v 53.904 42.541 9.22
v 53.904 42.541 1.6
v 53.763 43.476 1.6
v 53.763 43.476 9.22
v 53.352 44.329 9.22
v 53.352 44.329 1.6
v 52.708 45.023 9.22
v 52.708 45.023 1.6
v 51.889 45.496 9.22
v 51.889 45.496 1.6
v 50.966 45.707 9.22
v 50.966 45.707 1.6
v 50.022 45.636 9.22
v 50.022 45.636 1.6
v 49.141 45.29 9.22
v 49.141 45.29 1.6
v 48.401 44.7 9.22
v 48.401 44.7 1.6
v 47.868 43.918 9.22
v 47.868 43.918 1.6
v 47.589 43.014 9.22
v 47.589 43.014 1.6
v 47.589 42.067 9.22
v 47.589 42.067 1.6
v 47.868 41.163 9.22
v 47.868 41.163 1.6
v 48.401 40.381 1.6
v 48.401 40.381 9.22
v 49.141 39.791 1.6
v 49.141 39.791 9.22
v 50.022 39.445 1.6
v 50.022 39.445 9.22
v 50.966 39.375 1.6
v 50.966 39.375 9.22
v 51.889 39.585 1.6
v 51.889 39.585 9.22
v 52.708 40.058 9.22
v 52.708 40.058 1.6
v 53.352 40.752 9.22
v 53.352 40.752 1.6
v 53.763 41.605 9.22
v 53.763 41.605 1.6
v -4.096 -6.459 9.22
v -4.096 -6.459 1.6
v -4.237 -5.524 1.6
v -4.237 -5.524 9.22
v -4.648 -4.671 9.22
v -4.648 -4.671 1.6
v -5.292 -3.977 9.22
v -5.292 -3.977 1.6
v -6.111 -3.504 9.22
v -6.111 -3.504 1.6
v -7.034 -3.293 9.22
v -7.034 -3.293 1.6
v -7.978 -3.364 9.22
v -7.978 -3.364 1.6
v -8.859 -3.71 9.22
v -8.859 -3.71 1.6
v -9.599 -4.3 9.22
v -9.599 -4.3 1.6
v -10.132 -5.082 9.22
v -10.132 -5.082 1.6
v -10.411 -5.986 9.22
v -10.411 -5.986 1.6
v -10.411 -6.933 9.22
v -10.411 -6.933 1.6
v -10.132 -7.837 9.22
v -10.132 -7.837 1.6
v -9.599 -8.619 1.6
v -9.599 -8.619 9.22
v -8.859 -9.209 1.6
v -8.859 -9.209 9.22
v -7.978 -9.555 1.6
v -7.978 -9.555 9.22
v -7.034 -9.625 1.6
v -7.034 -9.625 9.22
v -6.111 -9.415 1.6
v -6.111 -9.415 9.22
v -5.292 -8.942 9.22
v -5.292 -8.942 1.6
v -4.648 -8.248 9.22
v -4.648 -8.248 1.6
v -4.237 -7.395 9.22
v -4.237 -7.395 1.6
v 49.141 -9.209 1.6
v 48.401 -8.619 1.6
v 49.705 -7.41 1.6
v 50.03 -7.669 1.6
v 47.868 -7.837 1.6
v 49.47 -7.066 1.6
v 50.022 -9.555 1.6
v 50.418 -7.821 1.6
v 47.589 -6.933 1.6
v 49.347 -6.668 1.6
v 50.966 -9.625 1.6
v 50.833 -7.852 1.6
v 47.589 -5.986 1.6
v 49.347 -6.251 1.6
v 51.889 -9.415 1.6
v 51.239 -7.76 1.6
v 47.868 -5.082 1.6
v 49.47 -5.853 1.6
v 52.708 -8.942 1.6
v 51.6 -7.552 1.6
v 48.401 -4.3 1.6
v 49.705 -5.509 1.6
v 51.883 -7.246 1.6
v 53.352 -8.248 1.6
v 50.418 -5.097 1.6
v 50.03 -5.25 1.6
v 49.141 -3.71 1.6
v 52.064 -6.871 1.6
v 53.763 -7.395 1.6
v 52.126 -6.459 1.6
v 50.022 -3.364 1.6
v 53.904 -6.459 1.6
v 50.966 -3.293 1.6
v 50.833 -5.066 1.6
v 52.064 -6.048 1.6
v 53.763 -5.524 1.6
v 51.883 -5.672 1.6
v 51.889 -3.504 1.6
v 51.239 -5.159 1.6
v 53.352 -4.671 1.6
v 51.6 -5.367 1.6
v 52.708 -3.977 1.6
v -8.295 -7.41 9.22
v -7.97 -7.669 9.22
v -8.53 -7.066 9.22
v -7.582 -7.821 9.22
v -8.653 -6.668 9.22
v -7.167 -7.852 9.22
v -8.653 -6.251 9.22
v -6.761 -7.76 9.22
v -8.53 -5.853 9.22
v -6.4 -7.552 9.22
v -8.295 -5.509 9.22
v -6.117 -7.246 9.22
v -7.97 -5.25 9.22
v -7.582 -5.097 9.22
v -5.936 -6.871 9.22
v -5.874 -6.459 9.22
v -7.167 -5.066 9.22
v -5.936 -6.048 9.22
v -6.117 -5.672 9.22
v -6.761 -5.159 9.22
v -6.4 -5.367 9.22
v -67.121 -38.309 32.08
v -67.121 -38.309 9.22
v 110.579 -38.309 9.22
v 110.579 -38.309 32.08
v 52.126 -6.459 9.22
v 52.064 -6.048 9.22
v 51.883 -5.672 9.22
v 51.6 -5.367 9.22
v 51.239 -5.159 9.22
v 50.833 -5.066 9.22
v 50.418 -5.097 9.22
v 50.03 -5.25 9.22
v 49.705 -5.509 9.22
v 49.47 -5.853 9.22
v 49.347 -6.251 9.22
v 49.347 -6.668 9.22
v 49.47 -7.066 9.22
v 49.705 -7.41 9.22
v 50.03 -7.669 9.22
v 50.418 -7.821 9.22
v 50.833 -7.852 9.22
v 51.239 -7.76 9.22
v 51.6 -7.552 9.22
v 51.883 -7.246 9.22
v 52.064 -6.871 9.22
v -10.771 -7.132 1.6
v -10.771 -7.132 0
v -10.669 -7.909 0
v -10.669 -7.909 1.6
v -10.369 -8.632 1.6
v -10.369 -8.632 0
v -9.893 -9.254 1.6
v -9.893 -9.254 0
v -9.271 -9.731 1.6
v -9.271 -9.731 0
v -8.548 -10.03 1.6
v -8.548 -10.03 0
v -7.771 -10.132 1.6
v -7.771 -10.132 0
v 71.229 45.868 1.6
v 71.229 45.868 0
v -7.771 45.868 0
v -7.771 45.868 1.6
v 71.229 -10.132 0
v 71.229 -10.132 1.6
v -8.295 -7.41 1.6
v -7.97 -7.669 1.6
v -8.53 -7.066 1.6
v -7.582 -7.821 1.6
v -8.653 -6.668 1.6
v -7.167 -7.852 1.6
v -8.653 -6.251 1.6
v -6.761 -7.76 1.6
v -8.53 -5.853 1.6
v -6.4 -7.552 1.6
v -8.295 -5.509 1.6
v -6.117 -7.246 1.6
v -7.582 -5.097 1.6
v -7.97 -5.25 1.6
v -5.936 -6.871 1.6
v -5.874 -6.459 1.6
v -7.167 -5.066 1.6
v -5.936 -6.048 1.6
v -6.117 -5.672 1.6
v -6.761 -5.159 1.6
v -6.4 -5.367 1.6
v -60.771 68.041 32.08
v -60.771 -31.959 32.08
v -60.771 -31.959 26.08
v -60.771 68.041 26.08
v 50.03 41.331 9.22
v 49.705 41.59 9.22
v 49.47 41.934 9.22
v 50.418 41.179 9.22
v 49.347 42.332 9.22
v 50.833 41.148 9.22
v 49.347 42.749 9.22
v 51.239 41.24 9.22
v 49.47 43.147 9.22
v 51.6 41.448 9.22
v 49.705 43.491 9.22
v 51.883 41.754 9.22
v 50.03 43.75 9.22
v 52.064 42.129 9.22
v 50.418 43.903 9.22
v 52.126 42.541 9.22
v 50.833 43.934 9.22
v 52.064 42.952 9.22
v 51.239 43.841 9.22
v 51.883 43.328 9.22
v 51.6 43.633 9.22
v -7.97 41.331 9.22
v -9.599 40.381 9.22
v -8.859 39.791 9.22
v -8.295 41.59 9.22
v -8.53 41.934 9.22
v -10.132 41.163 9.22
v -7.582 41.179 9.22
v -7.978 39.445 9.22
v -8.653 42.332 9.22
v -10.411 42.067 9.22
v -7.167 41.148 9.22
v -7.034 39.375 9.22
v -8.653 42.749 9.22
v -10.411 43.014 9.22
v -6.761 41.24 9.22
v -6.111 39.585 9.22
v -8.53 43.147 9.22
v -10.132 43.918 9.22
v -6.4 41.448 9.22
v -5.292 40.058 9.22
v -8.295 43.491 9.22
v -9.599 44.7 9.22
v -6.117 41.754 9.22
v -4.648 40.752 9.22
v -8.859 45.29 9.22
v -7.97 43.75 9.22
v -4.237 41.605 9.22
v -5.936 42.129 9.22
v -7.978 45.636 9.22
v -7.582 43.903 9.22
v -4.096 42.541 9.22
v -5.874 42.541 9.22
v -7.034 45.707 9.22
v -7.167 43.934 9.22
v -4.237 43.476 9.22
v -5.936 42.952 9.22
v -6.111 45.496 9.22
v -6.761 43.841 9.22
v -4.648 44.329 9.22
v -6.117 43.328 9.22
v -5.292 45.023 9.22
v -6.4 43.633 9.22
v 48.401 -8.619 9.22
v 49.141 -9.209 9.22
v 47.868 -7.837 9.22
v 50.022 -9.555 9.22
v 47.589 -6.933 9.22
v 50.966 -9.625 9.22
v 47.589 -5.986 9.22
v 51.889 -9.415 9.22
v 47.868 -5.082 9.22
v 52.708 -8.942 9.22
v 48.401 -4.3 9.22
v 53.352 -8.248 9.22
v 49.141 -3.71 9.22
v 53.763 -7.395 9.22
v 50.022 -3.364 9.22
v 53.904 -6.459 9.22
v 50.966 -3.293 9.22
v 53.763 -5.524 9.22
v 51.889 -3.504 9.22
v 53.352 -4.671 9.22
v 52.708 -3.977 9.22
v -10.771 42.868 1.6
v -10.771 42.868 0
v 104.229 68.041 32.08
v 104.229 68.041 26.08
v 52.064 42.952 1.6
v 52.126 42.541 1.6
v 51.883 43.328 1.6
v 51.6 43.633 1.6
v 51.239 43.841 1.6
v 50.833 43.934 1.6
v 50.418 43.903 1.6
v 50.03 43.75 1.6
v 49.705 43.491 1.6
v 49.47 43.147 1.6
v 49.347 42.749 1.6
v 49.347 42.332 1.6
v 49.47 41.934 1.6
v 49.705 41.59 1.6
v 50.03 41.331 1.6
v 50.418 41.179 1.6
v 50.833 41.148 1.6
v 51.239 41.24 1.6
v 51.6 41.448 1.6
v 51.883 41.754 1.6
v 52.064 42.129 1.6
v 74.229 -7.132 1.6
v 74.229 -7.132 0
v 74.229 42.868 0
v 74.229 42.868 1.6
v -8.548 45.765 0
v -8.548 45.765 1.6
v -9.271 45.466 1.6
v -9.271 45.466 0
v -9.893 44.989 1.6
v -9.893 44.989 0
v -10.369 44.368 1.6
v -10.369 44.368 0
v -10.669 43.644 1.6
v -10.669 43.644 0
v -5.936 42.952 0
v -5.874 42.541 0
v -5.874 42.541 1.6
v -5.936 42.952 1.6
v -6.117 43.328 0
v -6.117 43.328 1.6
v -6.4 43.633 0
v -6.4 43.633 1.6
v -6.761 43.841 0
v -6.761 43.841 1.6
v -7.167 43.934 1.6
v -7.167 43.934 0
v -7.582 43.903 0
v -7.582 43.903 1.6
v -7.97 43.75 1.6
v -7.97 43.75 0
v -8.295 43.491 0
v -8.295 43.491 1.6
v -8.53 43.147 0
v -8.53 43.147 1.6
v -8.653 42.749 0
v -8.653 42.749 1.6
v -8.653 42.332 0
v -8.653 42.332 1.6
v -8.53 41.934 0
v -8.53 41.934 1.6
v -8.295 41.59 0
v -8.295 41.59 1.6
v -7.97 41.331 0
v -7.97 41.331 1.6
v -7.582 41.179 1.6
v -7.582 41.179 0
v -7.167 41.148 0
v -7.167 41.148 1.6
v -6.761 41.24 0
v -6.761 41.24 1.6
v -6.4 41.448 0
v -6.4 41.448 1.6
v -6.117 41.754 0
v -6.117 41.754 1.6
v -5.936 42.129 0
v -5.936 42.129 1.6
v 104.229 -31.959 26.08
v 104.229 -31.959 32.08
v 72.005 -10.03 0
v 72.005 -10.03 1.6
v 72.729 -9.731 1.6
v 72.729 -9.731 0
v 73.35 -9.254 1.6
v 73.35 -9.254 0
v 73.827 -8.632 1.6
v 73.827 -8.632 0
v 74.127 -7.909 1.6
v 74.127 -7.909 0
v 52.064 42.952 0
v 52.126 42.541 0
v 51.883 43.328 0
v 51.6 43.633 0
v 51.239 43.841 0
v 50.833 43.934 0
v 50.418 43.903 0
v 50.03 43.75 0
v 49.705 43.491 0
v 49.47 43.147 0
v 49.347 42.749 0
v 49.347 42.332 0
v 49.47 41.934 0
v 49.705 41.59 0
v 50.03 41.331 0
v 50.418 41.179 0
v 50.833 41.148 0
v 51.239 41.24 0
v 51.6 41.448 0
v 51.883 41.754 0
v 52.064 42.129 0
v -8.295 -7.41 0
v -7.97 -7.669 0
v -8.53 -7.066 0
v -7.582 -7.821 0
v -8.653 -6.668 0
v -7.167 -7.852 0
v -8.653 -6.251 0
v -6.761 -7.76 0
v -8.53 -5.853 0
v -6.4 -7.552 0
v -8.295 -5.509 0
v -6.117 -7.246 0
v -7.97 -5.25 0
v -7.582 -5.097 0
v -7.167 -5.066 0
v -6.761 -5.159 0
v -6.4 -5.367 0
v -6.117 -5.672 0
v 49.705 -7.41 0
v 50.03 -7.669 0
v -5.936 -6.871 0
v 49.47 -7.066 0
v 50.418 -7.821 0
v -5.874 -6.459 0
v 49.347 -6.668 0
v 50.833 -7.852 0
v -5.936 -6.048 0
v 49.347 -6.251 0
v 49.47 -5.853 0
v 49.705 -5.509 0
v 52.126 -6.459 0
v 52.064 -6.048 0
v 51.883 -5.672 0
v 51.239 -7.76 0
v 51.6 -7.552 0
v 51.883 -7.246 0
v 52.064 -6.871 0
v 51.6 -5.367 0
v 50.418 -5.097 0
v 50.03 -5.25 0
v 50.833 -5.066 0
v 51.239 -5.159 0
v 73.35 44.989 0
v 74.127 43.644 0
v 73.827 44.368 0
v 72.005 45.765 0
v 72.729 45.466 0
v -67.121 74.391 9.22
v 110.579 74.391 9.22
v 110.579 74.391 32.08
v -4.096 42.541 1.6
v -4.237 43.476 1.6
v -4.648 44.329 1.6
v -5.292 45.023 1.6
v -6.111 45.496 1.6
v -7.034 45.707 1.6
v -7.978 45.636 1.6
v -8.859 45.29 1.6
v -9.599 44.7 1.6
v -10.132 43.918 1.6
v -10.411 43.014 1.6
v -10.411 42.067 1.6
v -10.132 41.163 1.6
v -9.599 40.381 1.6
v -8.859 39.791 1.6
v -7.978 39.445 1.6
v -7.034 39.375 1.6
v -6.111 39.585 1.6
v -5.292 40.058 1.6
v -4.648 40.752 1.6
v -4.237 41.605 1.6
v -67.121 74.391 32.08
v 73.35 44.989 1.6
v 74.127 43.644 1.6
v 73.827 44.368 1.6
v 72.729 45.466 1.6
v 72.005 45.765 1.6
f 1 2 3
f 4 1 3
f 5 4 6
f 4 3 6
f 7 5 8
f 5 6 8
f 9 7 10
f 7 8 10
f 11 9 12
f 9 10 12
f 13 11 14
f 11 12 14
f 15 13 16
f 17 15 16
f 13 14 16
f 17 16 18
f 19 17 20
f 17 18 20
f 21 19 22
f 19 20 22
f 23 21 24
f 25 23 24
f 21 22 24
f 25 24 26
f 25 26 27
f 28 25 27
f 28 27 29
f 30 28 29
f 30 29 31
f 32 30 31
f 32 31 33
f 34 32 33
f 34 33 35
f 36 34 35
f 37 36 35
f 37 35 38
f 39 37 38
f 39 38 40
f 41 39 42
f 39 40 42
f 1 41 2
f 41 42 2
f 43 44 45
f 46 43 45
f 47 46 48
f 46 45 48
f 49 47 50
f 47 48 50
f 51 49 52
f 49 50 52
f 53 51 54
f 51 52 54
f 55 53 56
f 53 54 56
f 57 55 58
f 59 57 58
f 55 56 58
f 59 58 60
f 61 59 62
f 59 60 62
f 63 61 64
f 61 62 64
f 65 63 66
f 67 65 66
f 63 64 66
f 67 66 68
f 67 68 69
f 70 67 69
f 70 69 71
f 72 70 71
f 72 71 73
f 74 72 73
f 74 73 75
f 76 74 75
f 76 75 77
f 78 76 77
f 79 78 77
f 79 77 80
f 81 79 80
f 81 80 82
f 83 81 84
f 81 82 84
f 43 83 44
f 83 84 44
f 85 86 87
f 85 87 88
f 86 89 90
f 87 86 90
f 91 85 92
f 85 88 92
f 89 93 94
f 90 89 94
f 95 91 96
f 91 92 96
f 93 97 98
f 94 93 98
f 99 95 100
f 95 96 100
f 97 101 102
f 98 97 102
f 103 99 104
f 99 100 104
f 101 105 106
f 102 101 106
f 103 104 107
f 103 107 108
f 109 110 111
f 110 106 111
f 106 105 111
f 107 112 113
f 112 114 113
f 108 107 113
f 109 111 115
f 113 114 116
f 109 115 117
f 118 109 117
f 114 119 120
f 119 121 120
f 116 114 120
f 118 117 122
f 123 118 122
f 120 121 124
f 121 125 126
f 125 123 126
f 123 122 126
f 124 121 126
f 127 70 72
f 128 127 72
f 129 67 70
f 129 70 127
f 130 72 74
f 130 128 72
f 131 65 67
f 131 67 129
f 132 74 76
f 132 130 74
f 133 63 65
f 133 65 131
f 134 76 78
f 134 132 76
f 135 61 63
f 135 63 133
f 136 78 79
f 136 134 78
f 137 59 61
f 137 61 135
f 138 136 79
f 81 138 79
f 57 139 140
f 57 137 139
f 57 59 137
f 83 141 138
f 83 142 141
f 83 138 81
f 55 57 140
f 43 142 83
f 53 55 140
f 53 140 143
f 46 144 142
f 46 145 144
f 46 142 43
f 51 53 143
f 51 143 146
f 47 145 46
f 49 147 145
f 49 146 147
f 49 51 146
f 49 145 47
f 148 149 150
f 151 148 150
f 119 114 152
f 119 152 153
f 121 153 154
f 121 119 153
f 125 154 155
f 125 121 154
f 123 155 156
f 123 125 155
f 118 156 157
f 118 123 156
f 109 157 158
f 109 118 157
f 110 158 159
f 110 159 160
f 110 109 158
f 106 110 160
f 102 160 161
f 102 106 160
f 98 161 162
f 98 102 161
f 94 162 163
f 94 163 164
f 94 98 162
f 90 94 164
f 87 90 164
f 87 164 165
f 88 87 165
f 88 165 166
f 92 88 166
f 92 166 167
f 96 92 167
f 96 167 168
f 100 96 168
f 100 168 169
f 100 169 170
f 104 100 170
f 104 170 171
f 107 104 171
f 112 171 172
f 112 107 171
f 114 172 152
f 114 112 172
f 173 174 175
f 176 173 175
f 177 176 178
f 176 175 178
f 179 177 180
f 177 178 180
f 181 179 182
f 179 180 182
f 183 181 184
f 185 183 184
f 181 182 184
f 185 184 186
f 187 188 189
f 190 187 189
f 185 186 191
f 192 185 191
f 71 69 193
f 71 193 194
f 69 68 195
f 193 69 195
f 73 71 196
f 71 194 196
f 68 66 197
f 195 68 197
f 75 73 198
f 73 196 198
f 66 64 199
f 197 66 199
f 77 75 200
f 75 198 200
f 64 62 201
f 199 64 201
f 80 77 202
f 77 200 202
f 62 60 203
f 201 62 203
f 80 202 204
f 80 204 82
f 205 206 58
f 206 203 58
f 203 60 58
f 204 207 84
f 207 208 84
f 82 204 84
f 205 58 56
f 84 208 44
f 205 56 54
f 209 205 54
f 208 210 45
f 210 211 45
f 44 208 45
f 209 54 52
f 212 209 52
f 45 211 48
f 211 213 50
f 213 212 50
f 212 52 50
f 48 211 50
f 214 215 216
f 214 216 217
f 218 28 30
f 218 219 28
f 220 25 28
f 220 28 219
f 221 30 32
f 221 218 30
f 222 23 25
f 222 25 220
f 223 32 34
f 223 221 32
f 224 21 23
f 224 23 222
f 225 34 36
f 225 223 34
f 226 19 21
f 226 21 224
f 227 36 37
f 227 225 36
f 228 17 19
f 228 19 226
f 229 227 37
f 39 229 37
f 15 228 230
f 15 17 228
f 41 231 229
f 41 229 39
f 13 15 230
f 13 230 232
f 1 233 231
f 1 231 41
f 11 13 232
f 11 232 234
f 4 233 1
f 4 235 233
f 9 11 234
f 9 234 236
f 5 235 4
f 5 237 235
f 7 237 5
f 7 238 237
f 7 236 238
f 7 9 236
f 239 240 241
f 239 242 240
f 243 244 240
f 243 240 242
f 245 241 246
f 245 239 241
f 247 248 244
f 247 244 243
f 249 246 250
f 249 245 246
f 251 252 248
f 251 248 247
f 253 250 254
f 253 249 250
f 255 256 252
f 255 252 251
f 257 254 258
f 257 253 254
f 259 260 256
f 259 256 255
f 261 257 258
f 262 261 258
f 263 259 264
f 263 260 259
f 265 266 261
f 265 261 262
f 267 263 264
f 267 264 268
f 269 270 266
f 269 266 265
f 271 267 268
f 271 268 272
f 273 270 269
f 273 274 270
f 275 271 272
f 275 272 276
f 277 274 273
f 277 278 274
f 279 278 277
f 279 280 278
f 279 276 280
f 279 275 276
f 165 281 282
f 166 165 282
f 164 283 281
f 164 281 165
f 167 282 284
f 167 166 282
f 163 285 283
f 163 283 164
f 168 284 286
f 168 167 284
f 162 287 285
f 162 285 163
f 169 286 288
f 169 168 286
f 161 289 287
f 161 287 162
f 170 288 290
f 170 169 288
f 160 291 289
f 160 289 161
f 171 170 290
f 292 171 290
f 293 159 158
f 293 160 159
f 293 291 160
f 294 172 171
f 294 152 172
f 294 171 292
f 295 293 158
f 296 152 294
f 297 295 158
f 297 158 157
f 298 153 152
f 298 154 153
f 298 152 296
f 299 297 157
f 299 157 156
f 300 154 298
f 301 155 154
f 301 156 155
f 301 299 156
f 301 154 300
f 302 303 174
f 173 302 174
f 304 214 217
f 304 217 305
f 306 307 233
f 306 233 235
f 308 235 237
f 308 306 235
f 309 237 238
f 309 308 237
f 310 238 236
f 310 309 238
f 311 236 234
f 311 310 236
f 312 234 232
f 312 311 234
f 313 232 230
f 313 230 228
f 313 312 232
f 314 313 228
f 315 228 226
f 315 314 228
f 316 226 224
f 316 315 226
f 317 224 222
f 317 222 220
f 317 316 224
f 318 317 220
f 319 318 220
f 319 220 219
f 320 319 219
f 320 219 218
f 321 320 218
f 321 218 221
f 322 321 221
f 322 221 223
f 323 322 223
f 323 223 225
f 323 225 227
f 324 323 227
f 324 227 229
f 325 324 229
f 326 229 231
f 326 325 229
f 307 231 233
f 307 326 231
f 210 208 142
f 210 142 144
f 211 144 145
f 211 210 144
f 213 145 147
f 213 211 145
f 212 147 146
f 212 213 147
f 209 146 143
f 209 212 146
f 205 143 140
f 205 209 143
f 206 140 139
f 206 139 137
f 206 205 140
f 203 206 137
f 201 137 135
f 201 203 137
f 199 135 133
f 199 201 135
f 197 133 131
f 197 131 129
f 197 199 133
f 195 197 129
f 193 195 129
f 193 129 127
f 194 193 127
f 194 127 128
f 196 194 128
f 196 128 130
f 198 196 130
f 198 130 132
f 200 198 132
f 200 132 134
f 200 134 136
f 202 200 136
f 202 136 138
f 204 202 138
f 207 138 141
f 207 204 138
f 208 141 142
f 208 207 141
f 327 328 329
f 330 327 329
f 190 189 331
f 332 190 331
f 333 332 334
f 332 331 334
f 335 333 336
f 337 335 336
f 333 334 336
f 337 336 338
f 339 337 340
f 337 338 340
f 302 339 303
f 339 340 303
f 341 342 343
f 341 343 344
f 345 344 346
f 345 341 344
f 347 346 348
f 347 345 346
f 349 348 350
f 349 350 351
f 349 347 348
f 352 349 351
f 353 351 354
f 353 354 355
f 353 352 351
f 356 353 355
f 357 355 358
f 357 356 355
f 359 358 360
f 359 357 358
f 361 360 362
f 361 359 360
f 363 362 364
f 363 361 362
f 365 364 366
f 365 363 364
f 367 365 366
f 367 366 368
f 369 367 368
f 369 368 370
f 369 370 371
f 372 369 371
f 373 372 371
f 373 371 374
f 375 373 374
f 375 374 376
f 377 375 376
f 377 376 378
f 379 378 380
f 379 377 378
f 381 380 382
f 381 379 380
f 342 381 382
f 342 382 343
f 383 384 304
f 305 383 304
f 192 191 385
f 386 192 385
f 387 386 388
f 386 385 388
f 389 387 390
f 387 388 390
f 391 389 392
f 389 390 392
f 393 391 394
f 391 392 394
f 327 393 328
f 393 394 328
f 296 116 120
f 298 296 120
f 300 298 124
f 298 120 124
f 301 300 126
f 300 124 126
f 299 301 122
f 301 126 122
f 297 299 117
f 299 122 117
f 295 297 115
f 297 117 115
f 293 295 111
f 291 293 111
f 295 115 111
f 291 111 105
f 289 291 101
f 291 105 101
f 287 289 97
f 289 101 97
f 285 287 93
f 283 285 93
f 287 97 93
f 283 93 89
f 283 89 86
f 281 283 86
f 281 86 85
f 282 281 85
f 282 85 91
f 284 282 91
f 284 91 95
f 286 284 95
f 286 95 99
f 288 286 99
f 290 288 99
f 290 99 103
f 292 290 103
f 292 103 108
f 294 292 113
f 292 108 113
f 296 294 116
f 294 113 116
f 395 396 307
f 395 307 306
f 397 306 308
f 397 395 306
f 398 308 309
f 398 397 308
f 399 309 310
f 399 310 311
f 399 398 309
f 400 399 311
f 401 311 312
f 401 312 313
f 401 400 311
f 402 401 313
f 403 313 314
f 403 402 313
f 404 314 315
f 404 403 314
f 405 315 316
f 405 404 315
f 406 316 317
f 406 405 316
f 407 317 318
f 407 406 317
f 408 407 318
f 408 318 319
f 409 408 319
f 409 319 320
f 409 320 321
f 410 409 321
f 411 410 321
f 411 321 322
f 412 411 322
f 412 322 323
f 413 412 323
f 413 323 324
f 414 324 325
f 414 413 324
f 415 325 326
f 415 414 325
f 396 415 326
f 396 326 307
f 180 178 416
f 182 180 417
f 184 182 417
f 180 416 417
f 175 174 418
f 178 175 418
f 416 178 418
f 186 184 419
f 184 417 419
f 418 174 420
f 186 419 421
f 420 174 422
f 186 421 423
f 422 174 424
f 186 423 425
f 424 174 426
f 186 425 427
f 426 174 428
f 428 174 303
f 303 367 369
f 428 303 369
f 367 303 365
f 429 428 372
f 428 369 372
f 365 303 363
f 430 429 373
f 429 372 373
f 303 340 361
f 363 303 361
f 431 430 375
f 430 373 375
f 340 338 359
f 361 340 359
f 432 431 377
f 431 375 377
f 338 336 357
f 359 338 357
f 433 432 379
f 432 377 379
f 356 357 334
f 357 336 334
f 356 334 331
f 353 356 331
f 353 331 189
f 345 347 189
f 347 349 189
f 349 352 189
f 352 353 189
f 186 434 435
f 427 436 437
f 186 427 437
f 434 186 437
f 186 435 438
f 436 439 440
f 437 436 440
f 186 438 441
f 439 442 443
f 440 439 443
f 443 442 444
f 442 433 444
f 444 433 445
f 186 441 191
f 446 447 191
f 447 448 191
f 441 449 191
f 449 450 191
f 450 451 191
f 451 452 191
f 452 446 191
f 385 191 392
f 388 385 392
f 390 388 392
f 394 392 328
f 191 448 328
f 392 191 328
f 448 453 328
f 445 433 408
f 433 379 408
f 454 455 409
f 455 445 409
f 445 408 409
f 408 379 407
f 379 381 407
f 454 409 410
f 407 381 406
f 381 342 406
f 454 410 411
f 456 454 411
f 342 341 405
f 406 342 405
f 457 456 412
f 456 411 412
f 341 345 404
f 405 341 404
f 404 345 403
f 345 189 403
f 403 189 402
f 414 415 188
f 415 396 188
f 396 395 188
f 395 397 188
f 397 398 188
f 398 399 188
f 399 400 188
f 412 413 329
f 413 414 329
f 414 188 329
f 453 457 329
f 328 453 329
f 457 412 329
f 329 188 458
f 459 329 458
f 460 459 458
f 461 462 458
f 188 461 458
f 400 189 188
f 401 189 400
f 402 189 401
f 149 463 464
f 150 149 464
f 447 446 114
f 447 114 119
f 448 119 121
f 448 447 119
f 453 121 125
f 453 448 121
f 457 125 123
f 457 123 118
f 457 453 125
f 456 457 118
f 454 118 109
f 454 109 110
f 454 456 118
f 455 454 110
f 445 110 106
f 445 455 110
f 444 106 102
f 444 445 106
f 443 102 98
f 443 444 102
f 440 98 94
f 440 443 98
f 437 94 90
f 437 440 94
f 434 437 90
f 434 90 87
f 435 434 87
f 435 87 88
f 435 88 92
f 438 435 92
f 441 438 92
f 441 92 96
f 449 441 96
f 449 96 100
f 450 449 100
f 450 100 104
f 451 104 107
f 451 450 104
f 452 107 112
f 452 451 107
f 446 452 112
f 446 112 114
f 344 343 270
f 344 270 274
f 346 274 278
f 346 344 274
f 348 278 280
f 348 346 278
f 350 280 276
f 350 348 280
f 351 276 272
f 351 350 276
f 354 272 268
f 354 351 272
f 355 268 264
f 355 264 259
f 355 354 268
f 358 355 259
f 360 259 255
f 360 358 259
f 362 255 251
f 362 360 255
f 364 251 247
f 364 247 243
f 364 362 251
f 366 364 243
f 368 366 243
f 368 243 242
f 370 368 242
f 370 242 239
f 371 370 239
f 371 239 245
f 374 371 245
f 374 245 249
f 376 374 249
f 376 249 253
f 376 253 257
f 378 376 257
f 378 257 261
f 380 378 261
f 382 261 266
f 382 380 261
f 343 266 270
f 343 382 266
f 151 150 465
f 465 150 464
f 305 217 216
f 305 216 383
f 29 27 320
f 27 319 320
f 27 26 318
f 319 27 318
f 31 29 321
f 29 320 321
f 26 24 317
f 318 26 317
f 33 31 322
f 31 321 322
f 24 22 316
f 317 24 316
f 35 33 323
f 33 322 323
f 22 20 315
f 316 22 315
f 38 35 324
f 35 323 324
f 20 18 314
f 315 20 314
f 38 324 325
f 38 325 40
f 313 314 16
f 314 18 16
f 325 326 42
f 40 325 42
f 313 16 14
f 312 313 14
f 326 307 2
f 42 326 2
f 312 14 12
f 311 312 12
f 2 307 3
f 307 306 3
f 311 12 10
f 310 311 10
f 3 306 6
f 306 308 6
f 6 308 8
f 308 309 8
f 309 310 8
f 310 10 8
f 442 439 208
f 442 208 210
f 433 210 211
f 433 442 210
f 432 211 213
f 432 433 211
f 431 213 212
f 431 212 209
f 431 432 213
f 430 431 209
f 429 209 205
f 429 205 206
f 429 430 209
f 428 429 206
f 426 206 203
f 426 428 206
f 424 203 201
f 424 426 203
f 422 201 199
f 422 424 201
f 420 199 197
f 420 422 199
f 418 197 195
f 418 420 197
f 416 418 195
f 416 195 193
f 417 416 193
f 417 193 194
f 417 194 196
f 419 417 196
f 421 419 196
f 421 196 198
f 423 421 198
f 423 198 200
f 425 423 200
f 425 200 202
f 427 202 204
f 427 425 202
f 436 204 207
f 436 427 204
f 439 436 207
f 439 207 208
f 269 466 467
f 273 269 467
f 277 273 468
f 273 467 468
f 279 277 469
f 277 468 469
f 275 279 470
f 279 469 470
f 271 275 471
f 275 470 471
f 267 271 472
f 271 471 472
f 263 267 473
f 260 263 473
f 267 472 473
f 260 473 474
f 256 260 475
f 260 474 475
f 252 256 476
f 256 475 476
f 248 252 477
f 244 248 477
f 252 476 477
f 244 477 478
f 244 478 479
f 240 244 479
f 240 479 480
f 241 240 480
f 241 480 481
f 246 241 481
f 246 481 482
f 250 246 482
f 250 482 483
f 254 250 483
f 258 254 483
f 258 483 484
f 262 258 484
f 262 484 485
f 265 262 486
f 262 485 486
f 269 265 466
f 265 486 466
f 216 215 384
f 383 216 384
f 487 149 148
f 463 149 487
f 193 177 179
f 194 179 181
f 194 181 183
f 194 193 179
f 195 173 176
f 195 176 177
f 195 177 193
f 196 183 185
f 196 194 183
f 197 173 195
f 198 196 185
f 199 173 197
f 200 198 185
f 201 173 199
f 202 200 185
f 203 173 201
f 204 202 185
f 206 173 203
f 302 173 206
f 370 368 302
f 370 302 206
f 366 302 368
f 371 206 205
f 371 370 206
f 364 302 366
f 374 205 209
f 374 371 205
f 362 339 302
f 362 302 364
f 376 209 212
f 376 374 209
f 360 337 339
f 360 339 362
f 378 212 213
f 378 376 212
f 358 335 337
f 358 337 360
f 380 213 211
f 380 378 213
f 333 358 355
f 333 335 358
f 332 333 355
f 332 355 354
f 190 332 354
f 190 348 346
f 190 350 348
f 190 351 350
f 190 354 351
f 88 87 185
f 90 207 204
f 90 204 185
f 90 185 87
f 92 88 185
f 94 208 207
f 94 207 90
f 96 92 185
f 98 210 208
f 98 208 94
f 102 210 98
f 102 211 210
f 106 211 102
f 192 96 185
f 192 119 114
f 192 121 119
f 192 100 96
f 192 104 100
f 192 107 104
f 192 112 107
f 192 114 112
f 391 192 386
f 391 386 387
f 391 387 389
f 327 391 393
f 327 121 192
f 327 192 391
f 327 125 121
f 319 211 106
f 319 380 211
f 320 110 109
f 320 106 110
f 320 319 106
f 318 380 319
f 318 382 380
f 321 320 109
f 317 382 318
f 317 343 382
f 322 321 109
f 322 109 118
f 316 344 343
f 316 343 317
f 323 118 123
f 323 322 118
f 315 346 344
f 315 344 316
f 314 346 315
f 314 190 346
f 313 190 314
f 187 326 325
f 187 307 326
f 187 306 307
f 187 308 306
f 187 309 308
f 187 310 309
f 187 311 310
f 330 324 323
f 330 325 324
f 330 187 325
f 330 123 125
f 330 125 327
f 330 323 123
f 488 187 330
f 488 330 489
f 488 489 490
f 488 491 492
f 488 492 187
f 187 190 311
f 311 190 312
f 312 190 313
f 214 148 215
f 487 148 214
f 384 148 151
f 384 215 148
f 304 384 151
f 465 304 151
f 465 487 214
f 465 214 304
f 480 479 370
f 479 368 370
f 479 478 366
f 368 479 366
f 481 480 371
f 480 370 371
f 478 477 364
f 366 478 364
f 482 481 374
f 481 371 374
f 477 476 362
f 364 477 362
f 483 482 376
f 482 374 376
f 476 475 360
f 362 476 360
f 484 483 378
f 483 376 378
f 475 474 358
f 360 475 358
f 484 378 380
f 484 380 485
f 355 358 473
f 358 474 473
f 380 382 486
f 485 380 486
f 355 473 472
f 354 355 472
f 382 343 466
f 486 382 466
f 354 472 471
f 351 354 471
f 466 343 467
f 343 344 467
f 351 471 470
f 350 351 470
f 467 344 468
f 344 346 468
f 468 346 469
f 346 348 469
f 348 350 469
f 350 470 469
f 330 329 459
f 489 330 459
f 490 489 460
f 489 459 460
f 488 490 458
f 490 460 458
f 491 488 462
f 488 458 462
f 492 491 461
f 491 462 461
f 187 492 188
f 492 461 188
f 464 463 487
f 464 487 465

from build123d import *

# Parameters (mm, degrees)
F0_R      = 1.397
F1_DEPTH  = 1.6002
F2_R      = 3.175
F2_R_2    = 1.397
F3_DEPTH  = 7.62
F4_DEPTH  = 7.62
F5_DEPTH  = 7.62
F6_DEPTH  = 7.62
F7_W      = 177.699999
F7_H      = 112.699999
F8_DEPTH  = 22.86
F9_W      = 165
F9_H      = 100
F10_DEPTH = 6


with BuildPart() as f1:
    # F0 (on Top) → F1 (new body)
    with BuildSketch(Plane.XY):
        with BuildLine():
            ThreePointArc((-10.771206, -7.132443), (-9.892526, -9.253763), (-7.771206, -10.132443))
            Line((-7.771206, -10.132443), (71.228794, -10.132443))
            ThreePointArc((71.228794, -10.132443), (73.350115, -9.253763), (74.228794, -7.132443))
            Line((74.228794, -7.132443), (74.228794, 42.867557))
            ThreePointArc((74.228794, 42.867557), (73.350115, 44.988878), (71.228794, 45.867557))
            Line((71.228794, 45.867557), (-7.771206, 45.867557))
            ThreePointArc((-7.771206, 45.867557), (-9.892526, 44.988878), (-10.771206, 42.867557))
            Line((-10.771206, 42.867557), (-10.771206, 17.867557))
            Line((-10.771206, 17.867557), (-10.771206, -7.132443))
        make_face()
        with Locations((-7.271206, -6.459374)):
            Circle(F0_R, mode=Mode.SUBTRACT)
        with Locations((50.728794, -6.459374)):
            Circle(F0_R, mode=Mode.SUBTRACT)
        with Locations((-7.271206, 42.540626)):
            Circle(F0_R, mode=Mode.SUBTRACT)
        with Locations((50.728794, 42.540626)):
            Circle(F0_R, mode=Mode.SUBTRACT)
    extrude(amount=F1_DEPTH)


with BuildPart() as f3:
    # F2 (on face) → F3 (new body)
    with BuildSketch(Plane.XY.offset(1.6002)):
        with Locations((-7.271206, 42.540626)):
            Circle(F2_R)
        with Locations((-7.271206, 42.540626)):
            Circle(F2_R_2, mode=Mode.SUBTRACT)
    extrude(amount=F3_DEPTH)


with BuildPart() as f4:
    # F2 (on face) → F4 (new body)
    with BuildSketch(Plane.XY.offset(1.6002)):
        with Locations((-7.271206, -6.459374)):
            Circle(F2_R)
        with Locations((-7.271206, -6.459374)):
            Circle(F2_R_2, mode=Mode.SUBTRACT)
    extrude(amount=F4_DEPTH)


with BuildPart() as f5:
    # F2 (on face) → F5 (new body)
    with BuildSketch(Plane.XY.offset(1.6002)):
        with Locations((50.728794, 42.540626)):
            Circle(F2_R)
        with Locations((50.728794, 42.540626)):
            Circle(F2_R_2, mode=Mode.SUBTRACT)
    extrude(amount=F5_DEPTH)


with BuildPart() as f6:
    # F2 (on face) → F6 (new body)
    with BuildSketch(Plane.XY.offset(1.6002)):
        with Locations((50.728794, -6.459374)):
            Circle(F2_R)
        with Locations((50.728794, -6.459374)):
            Circle(F2_R_2, mode=Mode.SUBTRACT)
    extrude(amount=F6_DEPTH)


with BuildPart() as f8:
    # F7 (on face) → F8 (new body)
    with BuildSketch(Plane.XY.offset(9.2202)):
        with Locations((21.728794, 18.040626)):
            Rectangle(F7_W, F7_H)
    extrude(amount=F8_DEPTH)

    # F9 (on face) → F10 (cut)
    with BuildSketch(Plane.XY.offset(32.0802)):
        with Locations((21.728794, 18.040626)):
            Rectangle(F9_W, F9_H)
    extrude(amount=-F10_DEPTH, mode=Mode.SUBTRACT)


solid = Compound([f1.part, f3.part, f4.part, f5.part, f6.part, f8.part])
